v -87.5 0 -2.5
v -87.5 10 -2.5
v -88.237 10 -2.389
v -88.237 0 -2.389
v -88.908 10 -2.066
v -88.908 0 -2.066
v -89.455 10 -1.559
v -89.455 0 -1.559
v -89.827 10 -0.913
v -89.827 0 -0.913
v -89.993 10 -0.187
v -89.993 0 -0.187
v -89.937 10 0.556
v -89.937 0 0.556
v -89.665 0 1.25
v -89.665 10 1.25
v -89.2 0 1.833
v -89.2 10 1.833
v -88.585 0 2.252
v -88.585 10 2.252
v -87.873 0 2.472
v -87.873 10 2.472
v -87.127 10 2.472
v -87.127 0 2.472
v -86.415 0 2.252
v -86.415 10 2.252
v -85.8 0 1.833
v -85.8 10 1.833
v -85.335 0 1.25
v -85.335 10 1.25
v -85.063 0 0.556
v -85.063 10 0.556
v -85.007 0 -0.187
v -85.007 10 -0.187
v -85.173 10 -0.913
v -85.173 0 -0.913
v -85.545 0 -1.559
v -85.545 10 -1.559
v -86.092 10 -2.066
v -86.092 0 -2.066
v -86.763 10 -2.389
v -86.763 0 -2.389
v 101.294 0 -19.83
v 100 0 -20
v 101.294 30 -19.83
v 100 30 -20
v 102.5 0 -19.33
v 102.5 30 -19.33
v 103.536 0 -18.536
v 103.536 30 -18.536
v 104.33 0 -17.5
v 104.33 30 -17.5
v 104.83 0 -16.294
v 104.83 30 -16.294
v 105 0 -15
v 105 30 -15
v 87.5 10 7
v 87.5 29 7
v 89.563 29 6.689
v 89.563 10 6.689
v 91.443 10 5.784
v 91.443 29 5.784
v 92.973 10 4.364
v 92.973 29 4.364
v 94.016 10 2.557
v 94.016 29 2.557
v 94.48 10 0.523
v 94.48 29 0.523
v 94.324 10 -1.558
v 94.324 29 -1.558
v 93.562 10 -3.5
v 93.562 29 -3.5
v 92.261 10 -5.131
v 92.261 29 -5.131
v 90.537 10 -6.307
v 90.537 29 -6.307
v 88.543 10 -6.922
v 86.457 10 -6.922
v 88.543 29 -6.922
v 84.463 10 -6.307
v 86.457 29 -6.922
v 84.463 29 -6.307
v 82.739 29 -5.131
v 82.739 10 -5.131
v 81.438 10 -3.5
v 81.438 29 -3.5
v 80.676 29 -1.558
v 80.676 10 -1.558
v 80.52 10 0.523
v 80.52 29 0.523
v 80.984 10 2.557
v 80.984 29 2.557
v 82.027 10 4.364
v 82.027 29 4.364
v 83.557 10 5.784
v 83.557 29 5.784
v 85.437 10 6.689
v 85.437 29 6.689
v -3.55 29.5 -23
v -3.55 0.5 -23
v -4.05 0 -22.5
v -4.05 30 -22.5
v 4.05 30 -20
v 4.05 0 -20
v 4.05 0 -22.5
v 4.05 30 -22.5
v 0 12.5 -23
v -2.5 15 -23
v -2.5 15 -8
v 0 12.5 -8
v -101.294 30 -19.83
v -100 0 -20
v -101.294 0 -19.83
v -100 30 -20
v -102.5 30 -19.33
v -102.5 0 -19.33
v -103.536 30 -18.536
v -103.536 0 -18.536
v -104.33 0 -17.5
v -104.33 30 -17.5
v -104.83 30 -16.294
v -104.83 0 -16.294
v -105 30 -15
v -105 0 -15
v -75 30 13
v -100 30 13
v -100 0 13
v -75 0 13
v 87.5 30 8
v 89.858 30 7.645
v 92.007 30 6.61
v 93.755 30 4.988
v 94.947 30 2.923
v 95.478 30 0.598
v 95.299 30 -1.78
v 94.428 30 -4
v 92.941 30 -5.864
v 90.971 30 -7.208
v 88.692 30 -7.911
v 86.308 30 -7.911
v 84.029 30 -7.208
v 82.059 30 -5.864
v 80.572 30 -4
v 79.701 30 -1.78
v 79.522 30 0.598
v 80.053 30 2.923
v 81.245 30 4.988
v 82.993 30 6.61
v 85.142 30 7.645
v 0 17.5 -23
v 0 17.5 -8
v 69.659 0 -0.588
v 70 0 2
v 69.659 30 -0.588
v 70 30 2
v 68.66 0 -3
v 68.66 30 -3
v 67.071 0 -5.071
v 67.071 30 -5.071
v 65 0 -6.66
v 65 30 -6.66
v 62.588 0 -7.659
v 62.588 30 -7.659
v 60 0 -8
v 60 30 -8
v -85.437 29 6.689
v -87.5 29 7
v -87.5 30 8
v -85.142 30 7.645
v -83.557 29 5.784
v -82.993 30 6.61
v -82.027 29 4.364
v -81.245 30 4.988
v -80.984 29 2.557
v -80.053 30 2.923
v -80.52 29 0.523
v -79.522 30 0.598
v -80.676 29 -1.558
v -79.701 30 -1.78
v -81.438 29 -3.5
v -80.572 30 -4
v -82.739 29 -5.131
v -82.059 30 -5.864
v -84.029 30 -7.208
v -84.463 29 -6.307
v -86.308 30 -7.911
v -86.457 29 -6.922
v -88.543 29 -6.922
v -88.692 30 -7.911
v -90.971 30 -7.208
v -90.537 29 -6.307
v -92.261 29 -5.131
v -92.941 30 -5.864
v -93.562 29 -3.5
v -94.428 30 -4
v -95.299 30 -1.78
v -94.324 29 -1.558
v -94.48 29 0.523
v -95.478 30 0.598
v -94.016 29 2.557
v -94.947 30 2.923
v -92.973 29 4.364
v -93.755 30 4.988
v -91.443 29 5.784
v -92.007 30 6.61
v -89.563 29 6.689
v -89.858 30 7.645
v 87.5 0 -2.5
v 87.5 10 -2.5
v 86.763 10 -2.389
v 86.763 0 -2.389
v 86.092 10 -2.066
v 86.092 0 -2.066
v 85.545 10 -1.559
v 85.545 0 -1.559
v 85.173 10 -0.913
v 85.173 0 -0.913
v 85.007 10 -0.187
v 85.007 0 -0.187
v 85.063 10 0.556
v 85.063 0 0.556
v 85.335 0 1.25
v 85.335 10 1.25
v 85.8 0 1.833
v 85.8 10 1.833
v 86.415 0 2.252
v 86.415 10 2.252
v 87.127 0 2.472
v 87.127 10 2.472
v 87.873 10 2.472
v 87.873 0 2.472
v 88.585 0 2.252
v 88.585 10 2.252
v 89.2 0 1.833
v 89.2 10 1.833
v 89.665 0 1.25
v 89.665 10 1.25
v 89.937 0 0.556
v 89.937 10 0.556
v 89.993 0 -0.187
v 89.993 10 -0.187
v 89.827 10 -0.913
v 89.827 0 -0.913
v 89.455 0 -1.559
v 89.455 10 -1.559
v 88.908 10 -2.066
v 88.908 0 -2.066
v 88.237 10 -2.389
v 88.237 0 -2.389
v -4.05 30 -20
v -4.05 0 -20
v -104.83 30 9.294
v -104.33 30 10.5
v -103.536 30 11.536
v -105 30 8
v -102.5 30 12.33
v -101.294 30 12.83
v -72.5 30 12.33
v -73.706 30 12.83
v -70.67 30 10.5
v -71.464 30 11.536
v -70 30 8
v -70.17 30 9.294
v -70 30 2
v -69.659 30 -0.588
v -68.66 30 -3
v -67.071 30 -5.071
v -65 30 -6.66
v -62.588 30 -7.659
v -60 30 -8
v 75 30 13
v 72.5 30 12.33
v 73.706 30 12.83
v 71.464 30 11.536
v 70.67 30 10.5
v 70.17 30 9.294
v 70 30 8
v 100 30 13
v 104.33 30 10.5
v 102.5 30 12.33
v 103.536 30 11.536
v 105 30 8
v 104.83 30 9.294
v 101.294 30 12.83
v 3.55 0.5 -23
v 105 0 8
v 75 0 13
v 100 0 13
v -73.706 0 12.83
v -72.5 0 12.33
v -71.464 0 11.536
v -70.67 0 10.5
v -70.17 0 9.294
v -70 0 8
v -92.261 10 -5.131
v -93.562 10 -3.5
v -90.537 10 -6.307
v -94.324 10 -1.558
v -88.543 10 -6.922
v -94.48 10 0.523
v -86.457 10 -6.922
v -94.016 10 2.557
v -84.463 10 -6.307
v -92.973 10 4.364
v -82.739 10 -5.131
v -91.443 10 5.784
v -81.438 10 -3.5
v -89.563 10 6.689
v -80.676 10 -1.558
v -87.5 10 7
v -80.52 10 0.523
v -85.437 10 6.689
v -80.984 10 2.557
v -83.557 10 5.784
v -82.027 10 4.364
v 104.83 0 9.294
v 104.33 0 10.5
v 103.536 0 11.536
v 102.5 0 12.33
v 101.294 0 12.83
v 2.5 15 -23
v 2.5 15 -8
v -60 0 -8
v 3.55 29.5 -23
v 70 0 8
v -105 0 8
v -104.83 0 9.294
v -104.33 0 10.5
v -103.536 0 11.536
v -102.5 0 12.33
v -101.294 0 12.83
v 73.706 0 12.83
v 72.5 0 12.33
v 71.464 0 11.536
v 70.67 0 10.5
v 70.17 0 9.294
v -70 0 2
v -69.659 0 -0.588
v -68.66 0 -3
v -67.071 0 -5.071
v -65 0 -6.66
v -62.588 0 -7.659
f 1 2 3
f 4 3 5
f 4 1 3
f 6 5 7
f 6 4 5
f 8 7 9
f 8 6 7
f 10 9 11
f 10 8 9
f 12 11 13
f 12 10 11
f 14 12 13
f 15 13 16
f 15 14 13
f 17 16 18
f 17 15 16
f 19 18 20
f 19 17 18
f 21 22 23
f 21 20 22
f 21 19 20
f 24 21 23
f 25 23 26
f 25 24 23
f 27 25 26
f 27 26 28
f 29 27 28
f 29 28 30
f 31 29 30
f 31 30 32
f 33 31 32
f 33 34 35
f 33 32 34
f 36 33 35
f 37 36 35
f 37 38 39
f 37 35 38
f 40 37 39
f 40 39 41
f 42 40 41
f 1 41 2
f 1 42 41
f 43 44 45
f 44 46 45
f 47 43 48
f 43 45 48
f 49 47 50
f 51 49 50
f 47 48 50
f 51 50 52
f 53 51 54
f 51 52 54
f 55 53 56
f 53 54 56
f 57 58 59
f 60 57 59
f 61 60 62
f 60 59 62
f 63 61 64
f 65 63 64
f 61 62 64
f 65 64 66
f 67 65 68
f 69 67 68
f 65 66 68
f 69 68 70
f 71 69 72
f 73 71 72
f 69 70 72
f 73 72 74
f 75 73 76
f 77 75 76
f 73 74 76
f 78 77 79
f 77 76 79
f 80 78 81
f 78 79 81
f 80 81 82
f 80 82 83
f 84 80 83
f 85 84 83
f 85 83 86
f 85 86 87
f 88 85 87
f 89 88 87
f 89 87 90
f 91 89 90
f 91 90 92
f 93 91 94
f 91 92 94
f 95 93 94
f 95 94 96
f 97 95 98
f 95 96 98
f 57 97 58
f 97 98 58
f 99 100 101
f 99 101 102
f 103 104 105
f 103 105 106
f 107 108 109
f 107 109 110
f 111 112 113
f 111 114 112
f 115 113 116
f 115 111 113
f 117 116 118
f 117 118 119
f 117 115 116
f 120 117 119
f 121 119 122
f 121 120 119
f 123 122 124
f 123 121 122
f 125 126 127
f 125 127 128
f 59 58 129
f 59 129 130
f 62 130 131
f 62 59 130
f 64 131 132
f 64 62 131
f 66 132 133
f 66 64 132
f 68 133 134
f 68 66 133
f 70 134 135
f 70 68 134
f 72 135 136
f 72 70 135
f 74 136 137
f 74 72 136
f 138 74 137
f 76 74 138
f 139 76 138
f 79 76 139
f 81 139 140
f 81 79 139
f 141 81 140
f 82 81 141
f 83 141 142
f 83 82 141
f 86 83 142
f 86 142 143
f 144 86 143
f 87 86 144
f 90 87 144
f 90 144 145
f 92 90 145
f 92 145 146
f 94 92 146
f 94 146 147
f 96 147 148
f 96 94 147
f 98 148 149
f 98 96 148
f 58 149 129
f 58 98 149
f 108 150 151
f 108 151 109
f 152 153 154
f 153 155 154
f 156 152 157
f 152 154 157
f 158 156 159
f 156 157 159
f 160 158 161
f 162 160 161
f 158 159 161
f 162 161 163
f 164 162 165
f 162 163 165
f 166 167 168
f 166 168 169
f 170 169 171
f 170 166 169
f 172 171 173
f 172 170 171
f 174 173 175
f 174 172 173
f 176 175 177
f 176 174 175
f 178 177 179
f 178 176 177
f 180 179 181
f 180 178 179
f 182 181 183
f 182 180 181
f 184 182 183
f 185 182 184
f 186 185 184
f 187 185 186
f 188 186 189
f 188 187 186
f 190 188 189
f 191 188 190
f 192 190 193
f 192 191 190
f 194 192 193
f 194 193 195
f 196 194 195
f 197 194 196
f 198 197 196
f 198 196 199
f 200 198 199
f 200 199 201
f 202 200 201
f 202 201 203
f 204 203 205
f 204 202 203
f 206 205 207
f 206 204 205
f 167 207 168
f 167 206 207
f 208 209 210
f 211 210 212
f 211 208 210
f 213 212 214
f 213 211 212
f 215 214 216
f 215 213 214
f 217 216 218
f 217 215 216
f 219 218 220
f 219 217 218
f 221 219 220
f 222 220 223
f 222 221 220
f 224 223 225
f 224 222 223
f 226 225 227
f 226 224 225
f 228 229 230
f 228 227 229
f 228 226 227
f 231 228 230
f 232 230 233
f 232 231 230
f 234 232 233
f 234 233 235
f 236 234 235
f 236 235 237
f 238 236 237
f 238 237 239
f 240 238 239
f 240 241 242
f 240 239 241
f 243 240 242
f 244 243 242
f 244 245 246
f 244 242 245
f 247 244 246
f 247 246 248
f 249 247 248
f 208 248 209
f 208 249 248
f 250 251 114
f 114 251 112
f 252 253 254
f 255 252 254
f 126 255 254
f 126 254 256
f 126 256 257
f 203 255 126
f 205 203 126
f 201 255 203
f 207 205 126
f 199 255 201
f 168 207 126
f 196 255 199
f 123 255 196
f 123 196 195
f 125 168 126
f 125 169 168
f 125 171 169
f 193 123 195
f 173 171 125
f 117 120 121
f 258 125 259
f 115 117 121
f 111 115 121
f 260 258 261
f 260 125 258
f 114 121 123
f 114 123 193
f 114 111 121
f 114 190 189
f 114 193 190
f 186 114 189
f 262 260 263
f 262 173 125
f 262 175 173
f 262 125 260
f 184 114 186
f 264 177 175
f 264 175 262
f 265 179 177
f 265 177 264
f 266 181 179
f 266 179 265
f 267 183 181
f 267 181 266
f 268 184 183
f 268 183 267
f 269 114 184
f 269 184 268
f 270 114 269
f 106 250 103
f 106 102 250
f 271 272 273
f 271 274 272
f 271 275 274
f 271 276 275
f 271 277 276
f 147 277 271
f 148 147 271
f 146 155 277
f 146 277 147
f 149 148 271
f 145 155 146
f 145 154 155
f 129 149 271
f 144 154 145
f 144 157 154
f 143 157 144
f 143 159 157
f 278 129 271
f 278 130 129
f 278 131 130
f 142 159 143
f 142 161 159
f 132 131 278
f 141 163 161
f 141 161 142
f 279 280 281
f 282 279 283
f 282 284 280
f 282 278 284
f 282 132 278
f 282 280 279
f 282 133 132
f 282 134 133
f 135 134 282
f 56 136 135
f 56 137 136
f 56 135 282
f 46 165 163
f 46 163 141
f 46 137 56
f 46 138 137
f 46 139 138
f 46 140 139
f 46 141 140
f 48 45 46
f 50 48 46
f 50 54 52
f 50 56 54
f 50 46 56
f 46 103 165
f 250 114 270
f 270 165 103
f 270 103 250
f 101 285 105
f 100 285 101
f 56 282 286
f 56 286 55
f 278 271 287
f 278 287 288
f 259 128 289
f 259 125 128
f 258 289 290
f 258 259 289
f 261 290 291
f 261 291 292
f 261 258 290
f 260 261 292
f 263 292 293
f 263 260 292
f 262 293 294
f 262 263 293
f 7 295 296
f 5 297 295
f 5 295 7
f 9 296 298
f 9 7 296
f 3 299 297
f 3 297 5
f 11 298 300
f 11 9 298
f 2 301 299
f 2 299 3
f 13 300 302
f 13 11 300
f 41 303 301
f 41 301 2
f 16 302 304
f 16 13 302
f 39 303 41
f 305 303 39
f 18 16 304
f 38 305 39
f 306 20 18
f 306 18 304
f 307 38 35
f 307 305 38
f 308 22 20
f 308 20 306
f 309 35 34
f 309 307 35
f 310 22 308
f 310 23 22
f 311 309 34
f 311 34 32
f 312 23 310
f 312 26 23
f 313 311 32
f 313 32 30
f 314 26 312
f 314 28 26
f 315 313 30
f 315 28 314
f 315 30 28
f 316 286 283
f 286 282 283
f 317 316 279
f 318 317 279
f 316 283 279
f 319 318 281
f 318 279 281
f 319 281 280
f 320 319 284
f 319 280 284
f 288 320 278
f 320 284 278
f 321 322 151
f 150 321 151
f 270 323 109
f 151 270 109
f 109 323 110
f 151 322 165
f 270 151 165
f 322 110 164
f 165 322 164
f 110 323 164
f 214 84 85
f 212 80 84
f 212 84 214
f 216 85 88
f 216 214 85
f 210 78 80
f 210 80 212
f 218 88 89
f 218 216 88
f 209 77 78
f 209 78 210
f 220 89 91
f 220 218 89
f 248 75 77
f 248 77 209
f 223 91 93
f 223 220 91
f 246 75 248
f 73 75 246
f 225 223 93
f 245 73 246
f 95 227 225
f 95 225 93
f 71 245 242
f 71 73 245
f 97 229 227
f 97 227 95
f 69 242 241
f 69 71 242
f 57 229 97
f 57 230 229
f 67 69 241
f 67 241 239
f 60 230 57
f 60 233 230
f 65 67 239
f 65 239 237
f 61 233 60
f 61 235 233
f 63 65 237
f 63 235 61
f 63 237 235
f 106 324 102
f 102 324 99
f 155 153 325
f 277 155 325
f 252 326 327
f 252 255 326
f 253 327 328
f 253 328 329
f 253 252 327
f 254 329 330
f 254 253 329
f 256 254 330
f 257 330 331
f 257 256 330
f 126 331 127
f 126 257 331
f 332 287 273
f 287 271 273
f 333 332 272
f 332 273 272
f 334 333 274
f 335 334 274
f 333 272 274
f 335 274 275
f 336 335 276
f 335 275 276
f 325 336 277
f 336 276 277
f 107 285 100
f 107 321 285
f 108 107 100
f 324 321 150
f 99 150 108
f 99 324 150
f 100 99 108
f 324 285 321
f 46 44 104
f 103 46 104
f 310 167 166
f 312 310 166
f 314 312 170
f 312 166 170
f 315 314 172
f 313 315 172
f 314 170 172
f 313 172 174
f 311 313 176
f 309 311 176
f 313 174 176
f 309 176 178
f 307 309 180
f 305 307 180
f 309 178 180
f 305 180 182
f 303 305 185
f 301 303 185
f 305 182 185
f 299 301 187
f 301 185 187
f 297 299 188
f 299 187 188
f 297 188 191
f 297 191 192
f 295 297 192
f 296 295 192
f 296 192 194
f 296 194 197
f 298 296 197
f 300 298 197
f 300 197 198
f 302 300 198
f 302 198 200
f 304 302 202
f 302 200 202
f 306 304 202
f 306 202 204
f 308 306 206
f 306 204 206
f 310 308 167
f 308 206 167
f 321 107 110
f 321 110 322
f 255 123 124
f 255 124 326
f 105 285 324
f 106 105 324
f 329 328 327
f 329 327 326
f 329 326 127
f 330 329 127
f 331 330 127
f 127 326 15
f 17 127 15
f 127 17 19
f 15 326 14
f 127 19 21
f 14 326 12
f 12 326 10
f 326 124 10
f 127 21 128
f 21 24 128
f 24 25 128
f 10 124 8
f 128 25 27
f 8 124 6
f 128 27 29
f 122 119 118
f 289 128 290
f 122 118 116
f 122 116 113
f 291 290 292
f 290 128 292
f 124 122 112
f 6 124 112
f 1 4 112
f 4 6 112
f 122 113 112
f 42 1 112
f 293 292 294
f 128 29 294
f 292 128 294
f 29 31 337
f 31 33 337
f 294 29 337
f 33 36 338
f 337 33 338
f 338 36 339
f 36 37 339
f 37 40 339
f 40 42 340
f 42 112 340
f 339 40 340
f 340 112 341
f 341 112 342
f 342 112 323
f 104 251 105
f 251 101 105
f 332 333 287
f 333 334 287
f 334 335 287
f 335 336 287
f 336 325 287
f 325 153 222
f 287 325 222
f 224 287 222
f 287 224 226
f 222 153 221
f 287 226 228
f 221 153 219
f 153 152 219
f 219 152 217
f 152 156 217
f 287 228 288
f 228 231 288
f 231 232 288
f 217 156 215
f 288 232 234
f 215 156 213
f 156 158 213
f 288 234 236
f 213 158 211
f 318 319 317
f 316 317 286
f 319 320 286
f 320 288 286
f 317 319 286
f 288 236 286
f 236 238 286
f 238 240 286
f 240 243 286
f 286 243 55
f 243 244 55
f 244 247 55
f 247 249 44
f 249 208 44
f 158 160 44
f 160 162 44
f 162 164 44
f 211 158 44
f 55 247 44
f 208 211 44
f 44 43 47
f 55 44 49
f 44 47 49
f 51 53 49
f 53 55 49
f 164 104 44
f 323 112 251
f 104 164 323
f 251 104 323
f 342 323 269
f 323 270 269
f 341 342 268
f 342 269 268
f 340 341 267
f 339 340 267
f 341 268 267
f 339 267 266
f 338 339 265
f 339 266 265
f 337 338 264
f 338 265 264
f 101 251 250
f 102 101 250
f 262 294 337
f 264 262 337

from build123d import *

# Parameters (mm, degrees)
AUFSATZ_LINEAR_AUSTRAGEN1_DEPTH = 30
SKIZZE2_R                       = 7
SCHNITT_LINEAR_AUSTRAGEN1_DEPTH = 20
SKIZZE5_W                       = 8.1
SKIZZE5_H                       = 30
AUFSATZ_LINEAR_AUSTRAGEN2_DEPTH = 3
FASE2_SIZE                      = 0.5
FASE1_SIZE                      = 1
VERRUNDUNG1_R                   = 5
VERRUNDUNG2_R                   = 10
SCHNITT_LINEAR_AUSTRAGEN2_REACH = 113.597
SKIZZE8_R                       = 2.5
SCHNITT_LINEAR_AUSTRAGEN3_DEPTH = 112.202517957


with BuildPart() as part:
    # Skizze1 → Aufsatz-Linear austragen1 (new body)
    with BuildSketch(Plane(origin=(0, 0, 0), x_dir=(1, 0, 0), z_dir=(0, 1, 0))):
        Polygon((-105, 0), (-105, -13), (-70, -13), (-70, 8), (70, 8), (70, -13), (105, -13), (105, 0), (105, 20), (-105, 20), align=None)
    extrude(amount=AUFSATZ_LINEAR_AUSTRAGEN1_DEPTH)

    # Skizze2 → Schnitt-Linear austragen1 (cut)
    with BuildSketch(Plane(origin=(0, 30, 0), x_dir=(1, 0, 0), z_dir=(0, 1, 0))):
        with Locations(Location((-87.5, 0, 0), (0, 0, 270))):
            Circle(SKIZZE2_R)
        with Locations(Location((87.5, 0, 0), (0, 0, 270))):
            Circle(SKIZZE2_R)
    extrude(amount=-SCHNITT_LINEAR_AUSTRAGEN1_DEPTH, mode=Mode.SUBTRACT)

    # Skizze5 → Aufsatz-Linear austragen2 (add)
    with BuildSketch(Plane(origin=(0, 0, -20), x_dir=(-1, 0, 0), z_dir=(0, 0, -1))):
        with Locations((0, 15)):
            Rectangle(SKIZZE5_W, SKIZZE5_H)
    extrude(amount=AUFSATZ_LINEAR_AUSTRAGEN2_DEPTH)

    # Fase2
    fase2_edges = [part.edges().sort_by_distance(p)[0] for p in [
        (-4.05, 15, -23),
        (0, 0, -23),
        (4.05, 15, -23),
        (0, 30, -23),
    ]]
    chamfer(fase2_edges, length=FASE2_SIZE)

    # Fase1
    fase1_edges = [part.edges().sort_by_distance(p)[0] for p in [
        (-87.5, 30, -7),
        (87.5, 30, -7),
    ]]
    chamfer(fase1_edges, length=FASE1_SIZE)

    # Verrundung1
    verrundung1_edges = [part.edges().sort_by_distance(p)[0] for p in [
        (-70, 15, 13),
        (-105, 15, 13),
        (105, 15, -20),
        (-105, 15, -20),
        (105, 15, 13),
        (70, 15, 13),
    ]]
    fillet(verrundung1_edges, radius=VERRUNDUNG1_R)

    # Verrundung2
    verrundung2_edges = [part.edges().sort_by_distance(p)[0] for p in [
        (70, 15, -8),
        (-70, 15, -8),
    ]]
    fillet(verrundung2_edges, radius=VERRUNDUNG2_R)

    # Skizze8 → Schnitt-Linear austragen2 (cut, up to next)
    with BuildSketch(Plane(origin=(0, 0, 0), x_dir=(1, 0, 0), z_dir=(0, 1, 0)), mode=Mode.PRIVATE) as schnitt_linear_austragen2_sk1:
        with Locations(Location((87.5, 0, 0), (0, 0, 90))):
            Circle(SKIZZE8_R)
    schnitt_linear_austragen2_tool1 = extrude(schnitt_linear_austragen2_sk1.sketch, amount=SCHNITT_LINEAR_AUSTRAGEN2_REACH, mode=Mode.PRIVATE) & part.part
    # Skizze8 → Schnitt-Linear austragen2 (cut, up to next)
    with BuildSketch(Plane(origin=(0, 0, 0), x_dir=(1, 0, 0), z_dir=(0, 1, 0)), mode=Mode.PRIVATE) as schnitt_linear_austragen2_sk2:
        with Locations(Location((-87.5, 0, 0), (0, 0, 90))):
            Circle(SKIZZE8_R)
    schnitt_linear_austragen2_tool2 = extrude(schnitt_linear_austragen2_sk2.sketch, amount=SCHNITT_LINEAR_AUSTRAGEN2_REACH, mode=Mode.PRIVATE) & part.part
    add(schnitt_linear_austragen2_tool1.solids().sort_by_distance((87.5, 0, 0))[0], mode=Mode.SUBTRACT)
    add(schnitt_linear_austragen2_tool2.solids().sort_by_distance((-87.5, 0, 0))[0], mode=Mode.SUBTRACT)

    # Skizze9 → Schnitt-Linear austragen3 (cut, through all)
    with BuildSketch(Plane.XY.offset(-8)):
        Polygon((0, 17.5), (-2.5, 15), (0, 12.5), (2.5, 15), align=None)
    extrude(amount=-SCHNITT_LINEAR_AUSTRAGEN3_DEPTH, mode=Mode.SUBTRACT)


solid = part.part
